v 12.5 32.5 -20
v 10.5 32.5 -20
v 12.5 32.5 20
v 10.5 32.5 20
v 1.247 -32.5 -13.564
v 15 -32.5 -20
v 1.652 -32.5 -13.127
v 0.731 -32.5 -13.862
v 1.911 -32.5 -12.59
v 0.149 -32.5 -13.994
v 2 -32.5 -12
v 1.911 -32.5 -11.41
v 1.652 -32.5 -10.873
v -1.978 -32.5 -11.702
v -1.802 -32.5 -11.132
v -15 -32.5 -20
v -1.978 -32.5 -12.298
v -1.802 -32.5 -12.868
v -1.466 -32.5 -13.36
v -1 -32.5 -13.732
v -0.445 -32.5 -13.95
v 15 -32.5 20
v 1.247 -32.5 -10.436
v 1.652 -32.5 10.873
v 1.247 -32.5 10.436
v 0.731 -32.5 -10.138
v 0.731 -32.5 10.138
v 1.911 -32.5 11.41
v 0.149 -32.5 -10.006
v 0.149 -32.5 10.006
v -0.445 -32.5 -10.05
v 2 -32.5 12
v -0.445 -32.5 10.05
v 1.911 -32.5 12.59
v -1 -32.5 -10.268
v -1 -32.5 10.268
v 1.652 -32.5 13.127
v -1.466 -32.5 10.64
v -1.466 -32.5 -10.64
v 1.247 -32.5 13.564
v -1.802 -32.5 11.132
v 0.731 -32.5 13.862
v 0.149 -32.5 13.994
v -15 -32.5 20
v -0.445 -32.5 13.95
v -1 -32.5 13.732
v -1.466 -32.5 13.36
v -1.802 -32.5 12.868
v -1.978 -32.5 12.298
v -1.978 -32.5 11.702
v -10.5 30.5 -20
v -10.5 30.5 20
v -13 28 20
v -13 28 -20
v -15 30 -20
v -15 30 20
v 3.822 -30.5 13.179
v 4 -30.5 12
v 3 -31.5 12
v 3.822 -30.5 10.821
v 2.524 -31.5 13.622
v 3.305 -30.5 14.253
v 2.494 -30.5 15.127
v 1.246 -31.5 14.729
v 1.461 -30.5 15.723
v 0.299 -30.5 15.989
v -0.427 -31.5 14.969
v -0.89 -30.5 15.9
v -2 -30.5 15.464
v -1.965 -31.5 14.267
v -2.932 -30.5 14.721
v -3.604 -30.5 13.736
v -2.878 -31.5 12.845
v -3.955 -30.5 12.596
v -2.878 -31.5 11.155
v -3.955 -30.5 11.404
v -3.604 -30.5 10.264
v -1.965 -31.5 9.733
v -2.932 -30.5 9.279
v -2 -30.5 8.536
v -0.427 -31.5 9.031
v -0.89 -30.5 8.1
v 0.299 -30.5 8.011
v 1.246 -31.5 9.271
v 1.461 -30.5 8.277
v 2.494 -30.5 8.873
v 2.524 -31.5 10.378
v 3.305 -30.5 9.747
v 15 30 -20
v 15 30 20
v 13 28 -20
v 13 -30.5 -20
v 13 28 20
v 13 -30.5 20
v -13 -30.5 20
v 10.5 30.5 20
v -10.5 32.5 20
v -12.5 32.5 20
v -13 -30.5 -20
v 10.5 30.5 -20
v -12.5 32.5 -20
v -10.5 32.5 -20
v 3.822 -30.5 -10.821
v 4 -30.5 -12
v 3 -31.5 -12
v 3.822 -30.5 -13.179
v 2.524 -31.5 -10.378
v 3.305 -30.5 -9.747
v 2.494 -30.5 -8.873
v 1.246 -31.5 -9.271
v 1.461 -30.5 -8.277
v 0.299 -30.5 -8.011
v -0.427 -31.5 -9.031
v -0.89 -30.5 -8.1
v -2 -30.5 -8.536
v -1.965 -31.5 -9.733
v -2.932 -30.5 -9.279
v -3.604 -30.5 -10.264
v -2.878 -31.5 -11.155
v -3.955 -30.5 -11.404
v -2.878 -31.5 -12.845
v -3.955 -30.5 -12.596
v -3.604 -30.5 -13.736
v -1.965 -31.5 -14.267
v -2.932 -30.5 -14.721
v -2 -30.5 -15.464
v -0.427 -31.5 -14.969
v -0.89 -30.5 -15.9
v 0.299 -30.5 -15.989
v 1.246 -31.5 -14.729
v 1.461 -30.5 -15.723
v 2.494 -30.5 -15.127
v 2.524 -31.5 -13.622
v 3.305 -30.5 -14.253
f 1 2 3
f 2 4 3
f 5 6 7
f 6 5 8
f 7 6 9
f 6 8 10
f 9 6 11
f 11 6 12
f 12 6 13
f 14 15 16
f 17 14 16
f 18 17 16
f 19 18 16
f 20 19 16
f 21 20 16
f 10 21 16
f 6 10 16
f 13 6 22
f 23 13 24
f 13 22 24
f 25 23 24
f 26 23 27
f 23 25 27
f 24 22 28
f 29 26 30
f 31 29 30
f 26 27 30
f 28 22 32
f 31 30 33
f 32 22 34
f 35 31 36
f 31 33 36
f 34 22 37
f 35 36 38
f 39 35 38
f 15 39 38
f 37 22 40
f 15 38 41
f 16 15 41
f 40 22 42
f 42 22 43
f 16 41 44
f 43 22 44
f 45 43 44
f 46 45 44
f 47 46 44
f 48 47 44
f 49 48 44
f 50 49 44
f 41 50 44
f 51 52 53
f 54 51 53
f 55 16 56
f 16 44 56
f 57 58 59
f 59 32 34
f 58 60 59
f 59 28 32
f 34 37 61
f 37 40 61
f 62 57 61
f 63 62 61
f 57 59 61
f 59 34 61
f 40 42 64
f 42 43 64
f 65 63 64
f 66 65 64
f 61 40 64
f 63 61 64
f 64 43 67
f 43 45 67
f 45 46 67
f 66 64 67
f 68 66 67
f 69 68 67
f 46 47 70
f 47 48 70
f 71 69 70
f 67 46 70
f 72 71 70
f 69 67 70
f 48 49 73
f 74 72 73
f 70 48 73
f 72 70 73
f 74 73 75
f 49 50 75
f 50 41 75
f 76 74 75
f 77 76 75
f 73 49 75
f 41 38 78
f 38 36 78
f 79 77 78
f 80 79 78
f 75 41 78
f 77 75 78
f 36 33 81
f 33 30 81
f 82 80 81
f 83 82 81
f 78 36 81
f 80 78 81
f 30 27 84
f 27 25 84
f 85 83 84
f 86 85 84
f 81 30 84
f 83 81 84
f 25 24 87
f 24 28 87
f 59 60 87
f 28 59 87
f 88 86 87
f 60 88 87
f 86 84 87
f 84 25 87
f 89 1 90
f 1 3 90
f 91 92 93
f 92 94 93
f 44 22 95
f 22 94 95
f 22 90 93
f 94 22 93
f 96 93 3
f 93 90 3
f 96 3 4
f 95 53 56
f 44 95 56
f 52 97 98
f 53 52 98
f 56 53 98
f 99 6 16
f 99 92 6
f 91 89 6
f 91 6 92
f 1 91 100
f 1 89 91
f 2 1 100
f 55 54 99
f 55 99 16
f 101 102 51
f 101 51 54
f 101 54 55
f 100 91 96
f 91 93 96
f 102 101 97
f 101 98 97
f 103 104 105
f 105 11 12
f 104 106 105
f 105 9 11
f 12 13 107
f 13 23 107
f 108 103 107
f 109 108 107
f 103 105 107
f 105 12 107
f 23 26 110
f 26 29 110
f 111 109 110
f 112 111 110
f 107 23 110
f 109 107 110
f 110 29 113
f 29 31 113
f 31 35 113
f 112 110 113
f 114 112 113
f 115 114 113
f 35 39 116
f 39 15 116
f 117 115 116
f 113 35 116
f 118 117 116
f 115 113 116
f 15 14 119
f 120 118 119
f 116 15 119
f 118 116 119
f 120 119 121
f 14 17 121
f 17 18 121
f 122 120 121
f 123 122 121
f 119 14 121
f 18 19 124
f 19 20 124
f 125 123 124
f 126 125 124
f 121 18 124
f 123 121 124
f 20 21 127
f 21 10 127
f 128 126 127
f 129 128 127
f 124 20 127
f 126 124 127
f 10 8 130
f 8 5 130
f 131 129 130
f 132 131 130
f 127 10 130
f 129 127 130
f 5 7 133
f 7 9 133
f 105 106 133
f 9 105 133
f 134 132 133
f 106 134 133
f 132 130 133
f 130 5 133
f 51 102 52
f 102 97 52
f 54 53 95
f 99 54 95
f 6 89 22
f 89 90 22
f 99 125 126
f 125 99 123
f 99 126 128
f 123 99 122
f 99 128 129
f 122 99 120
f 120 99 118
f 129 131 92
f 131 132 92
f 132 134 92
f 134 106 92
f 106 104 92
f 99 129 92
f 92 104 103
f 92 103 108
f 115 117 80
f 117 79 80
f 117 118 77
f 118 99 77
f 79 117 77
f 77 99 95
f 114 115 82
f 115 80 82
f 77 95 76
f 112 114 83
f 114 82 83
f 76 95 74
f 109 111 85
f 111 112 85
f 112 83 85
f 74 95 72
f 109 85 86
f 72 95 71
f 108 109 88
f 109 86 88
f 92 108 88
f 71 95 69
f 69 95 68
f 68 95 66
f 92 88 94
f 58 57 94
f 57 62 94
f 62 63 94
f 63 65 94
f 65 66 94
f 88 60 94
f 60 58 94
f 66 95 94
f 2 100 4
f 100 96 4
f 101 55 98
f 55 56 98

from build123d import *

# Parameters (mm, degrees)
PAD_DEPTH        = 20
HOLE_D           = 4
HOLE_DEPTH       = 25
HOLE_CSINK_D     = 8
HOLE_CSINK_ANGLE = 90


with BuildPart() as part:
    # Sketch → Pad (new body, symmetric)
    with BuildSketch(Plane.XY):
        Polygon((-13, -30.5), (13, -30.5), (13, 28), (10.5, 30.5), (10.5, 32.5), (12.5, 32.5), (15, 30), (15, -32.5), (-15, -32.5), (-15, 30), (-12.5, 32.5), (-10.5, 32.5), (-10.5, 30.5), (-13, 28), align=None)
    extrude(amount=PAD_DEPTH, both=True)

    # Hole
    with Locations(Plane(origin=(0, -30.5, 0), x_dir=(-1, 0, 0), z_dir=(0, 1, 0))):
        with Locations((0, 12), (0, -12)):
            CounterSinkHole(HOLE_D / 2, HOLE_CSINK_D / 2, depth=HOLE_DEPTH, counter_sink_angle=HOLE_CSINK_ANGLE)


solid = part.part
